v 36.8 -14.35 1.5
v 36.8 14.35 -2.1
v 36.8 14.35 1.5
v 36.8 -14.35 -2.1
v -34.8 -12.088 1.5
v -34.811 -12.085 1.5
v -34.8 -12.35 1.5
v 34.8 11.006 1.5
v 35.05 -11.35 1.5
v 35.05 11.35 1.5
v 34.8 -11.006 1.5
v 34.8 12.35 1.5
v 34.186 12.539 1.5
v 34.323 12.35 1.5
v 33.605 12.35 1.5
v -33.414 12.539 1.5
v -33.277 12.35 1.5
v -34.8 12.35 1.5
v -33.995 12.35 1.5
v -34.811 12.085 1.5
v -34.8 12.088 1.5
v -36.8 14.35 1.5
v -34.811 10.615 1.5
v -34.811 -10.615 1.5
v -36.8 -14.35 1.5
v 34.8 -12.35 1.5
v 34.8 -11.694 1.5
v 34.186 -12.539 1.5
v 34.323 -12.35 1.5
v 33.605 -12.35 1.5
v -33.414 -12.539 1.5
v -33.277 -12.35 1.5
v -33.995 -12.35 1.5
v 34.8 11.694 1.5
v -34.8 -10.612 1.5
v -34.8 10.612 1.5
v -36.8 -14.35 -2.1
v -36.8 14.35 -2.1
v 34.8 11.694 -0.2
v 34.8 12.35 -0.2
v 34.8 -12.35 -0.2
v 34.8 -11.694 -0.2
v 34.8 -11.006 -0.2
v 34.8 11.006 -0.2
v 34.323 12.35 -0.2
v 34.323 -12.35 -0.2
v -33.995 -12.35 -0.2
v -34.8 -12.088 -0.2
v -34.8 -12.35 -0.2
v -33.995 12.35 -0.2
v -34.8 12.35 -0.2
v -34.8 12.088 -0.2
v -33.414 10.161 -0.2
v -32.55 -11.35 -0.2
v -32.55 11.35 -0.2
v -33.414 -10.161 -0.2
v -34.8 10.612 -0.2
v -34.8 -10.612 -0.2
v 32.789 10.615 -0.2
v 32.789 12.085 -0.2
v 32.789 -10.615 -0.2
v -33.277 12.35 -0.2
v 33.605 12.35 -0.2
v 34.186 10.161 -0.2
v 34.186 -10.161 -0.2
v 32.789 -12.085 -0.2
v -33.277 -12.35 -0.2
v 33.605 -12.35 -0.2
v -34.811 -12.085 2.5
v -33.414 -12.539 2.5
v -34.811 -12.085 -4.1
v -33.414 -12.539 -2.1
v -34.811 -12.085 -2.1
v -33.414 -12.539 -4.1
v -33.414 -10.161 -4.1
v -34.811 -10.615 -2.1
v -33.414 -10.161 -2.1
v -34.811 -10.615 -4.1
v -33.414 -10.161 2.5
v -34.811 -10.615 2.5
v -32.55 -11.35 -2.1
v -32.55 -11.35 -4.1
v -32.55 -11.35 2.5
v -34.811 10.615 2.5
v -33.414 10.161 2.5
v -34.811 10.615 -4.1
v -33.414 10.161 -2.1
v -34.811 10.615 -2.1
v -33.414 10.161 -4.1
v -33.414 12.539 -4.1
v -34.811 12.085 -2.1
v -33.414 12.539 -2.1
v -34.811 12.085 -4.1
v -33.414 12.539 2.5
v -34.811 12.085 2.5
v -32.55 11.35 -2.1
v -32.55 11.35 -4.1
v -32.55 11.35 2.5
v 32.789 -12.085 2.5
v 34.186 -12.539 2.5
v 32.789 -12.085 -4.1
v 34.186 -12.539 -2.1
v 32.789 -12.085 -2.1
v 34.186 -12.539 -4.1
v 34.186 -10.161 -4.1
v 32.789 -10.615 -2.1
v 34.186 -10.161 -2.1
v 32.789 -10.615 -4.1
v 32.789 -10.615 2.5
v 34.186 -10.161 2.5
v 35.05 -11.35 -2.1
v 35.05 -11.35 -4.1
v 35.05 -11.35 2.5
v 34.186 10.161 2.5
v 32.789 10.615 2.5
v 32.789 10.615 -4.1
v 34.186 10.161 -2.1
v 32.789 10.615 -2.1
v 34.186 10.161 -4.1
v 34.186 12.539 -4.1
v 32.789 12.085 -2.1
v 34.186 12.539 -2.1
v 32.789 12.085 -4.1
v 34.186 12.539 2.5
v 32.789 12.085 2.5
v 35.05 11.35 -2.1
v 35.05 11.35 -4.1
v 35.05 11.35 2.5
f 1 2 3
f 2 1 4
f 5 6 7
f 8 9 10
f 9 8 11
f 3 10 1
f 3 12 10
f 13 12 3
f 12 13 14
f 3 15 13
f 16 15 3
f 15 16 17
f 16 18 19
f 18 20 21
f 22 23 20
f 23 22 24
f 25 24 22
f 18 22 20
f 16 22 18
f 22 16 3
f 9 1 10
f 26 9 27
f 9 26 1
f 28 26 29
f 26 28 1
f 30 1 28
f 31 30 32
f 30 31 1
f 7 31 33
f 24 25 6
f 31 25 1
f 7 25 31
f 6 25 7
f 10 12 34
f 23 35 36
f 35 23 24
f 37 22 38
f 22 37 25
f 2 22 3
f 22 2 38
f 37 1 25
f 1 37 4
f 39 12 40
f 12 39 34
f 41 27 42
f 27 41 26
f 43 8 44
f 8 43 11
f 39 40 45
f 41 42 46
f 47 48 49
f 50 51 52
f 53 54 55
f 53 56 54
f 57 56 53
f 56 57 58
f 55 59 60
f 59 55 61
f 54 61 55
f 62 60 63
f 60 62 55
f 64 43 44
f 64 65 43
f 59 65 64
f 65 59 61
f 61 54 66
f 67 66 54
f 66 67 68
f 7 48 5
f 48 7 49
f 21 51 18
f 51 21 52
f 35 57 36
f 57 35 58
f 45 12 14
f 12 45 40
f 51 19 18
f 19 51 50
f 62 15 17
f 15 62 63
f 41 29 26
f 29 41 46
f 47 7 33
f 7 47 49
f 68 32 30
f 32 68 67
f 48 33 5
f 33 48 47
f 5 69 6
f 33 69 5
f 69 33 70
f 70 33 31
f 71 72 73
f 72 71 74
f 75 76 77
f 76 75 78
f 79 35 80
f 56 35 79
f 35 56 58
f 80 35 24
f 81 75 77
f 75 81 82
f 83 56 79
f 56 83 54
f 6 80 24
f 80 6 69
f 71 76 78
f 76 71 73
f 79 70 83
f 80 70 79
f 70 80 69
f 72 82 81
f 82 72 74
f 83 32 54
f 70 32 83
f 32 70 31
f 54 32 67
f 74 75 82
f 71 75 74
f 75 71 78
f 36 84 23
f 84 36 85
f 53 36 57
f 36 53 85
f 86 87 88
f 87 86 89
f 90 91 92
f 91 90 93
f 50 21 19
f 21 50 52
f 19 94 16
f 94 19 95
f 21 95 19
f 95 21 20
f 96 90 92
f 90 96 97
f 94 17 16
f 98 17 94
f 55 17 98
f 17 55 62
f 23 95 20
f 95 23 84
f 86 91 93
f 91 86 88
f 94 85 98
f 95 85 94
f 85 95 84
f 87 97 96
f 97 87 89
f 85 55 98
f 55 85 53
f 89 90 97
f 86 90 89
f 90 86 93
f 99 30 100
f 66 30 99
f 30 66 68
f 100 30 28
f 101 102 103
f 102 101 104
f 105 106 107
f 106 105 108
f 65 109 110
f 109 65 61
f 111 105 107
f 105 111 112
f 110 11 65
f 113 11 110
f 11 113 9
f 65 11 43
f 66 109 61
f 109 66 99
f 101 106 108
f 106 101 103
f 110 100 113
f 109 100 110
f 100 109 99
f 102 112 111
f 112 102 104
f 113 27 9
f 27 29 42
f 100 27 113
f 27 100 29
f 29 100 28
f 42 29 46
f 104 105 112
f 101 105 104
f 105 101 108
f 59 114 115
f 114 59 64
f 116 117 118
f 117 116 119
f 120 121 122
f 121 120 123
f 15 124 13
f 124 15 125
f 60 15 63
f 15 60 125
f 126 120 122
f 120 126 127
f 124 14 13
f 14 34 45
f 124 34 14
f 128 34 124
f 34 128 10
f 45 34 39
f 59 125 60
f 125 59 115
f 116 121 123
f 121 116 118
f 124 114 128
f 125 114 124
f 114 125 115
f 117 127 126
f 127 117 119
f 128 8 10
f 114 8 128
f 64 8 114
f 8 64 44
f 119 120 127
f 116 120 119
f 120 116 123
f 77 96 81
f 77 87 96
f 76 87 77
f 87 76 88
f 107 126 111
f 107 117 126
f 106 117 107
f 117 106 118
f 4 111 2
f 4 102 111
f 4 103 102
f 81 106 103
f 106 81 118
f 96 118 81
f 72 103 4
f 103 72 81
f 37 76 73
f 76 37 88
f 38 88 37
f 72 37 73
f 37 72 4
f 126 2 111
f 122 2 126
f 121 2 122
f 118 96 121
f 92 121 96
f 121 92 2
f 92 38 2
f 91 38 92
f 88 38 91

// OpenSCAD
// Parameters
width_mm = 73.6; //[36.8:147.2:0.1]
height_mm = 28.7; //[14.35:57.4:0.1]
thickness_mm = 3; //[1.5:6:0.1]
aperture_margin_mm = 2; //[1:4:0.1]
aperture_depth_mm = 1.2; //[0.6:2.4:0.1]
pcb_thickness_mm = 1.6; //[0.8:3.2:0.1]
pcb_offset_z_mm = 0; //[-2:2:0.1]
mount_hole_diameter_mm = 2.5; //[1.25:5:0.1]
mount_hole_edge_offset_mm = 3; //[1.5:6:0.1]
overlap_mm = 1; //[0.5:2:0.1]

// Display module with detailed geometry
module display() {
  color([0.85, 0.85, 0.8]) {
    difference() {
      // Display body
      translate([0, 0, 0])
        cube([width_mm, height_mm, thickness_mm], center=true);
      // Front viewing area aperture
      translate([0, 0, thickness_mm/2 - aperture_depth_mm/2])
        cube([width_mm - 2*aperture_margin_mm, height_mm - 2*aperture_margin_mm, aperture_depth_mm + overlap_mm], center=true);
    }
  }
}

// Mod module with detailed geometry
module mod() {
  color([0.0, 0.4, 0.2]) {
    union() {
      // PCB backing plate
      translate([0, 0, -thickness_mm/2 - pcb_thickness_mm/2 + overlap_mm + pcb_offset_z_mm])
        cube([width_mm, height_mm, pcb_thickness_mm], center=true);
      // Mounting holes
      color("Black") {
        for (x = [-1, 1])
          for (y = [-1, 1])
            translate([x * (width_mm/2 - mount_hole_edge_offset_mm), y * (height_mm/2 - mount_hole_edge_offset_mm), -pcb_thickness_mm/2 + pcb_offset_z_mm])
              cylinder(h=thickness_mm + pcb_thickness_mm + 2*overlap_mm, r=mount_hole_diameter_mm/2, center=true);
      }
    }
  }
}

// Assembly of the display and mod
module assembly() {
  display();
  mod();
}

assembly();
